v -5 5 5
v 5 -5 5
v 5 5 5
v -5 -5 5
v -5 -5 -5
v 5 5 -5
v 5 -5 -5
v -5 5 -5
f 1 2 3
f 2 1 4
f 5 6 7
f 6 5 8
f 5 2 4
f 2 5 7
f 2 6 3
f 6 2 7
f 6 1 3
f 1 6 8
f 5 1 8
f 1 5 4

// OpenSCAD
// Variable names can be chosen freely!

// Size of the Cube in the X-direction (width)
sizeX = 10;

// Size of the Cube in the Y-direction (depth)
sizeY = 10;

// Size of the Cube in the Z-direction (height)
sizeZ = 10;

// Create the Cube
// The variables are used instead of numbers
cube(size = [sizeX, sizeY, sizeZ], center = true);
